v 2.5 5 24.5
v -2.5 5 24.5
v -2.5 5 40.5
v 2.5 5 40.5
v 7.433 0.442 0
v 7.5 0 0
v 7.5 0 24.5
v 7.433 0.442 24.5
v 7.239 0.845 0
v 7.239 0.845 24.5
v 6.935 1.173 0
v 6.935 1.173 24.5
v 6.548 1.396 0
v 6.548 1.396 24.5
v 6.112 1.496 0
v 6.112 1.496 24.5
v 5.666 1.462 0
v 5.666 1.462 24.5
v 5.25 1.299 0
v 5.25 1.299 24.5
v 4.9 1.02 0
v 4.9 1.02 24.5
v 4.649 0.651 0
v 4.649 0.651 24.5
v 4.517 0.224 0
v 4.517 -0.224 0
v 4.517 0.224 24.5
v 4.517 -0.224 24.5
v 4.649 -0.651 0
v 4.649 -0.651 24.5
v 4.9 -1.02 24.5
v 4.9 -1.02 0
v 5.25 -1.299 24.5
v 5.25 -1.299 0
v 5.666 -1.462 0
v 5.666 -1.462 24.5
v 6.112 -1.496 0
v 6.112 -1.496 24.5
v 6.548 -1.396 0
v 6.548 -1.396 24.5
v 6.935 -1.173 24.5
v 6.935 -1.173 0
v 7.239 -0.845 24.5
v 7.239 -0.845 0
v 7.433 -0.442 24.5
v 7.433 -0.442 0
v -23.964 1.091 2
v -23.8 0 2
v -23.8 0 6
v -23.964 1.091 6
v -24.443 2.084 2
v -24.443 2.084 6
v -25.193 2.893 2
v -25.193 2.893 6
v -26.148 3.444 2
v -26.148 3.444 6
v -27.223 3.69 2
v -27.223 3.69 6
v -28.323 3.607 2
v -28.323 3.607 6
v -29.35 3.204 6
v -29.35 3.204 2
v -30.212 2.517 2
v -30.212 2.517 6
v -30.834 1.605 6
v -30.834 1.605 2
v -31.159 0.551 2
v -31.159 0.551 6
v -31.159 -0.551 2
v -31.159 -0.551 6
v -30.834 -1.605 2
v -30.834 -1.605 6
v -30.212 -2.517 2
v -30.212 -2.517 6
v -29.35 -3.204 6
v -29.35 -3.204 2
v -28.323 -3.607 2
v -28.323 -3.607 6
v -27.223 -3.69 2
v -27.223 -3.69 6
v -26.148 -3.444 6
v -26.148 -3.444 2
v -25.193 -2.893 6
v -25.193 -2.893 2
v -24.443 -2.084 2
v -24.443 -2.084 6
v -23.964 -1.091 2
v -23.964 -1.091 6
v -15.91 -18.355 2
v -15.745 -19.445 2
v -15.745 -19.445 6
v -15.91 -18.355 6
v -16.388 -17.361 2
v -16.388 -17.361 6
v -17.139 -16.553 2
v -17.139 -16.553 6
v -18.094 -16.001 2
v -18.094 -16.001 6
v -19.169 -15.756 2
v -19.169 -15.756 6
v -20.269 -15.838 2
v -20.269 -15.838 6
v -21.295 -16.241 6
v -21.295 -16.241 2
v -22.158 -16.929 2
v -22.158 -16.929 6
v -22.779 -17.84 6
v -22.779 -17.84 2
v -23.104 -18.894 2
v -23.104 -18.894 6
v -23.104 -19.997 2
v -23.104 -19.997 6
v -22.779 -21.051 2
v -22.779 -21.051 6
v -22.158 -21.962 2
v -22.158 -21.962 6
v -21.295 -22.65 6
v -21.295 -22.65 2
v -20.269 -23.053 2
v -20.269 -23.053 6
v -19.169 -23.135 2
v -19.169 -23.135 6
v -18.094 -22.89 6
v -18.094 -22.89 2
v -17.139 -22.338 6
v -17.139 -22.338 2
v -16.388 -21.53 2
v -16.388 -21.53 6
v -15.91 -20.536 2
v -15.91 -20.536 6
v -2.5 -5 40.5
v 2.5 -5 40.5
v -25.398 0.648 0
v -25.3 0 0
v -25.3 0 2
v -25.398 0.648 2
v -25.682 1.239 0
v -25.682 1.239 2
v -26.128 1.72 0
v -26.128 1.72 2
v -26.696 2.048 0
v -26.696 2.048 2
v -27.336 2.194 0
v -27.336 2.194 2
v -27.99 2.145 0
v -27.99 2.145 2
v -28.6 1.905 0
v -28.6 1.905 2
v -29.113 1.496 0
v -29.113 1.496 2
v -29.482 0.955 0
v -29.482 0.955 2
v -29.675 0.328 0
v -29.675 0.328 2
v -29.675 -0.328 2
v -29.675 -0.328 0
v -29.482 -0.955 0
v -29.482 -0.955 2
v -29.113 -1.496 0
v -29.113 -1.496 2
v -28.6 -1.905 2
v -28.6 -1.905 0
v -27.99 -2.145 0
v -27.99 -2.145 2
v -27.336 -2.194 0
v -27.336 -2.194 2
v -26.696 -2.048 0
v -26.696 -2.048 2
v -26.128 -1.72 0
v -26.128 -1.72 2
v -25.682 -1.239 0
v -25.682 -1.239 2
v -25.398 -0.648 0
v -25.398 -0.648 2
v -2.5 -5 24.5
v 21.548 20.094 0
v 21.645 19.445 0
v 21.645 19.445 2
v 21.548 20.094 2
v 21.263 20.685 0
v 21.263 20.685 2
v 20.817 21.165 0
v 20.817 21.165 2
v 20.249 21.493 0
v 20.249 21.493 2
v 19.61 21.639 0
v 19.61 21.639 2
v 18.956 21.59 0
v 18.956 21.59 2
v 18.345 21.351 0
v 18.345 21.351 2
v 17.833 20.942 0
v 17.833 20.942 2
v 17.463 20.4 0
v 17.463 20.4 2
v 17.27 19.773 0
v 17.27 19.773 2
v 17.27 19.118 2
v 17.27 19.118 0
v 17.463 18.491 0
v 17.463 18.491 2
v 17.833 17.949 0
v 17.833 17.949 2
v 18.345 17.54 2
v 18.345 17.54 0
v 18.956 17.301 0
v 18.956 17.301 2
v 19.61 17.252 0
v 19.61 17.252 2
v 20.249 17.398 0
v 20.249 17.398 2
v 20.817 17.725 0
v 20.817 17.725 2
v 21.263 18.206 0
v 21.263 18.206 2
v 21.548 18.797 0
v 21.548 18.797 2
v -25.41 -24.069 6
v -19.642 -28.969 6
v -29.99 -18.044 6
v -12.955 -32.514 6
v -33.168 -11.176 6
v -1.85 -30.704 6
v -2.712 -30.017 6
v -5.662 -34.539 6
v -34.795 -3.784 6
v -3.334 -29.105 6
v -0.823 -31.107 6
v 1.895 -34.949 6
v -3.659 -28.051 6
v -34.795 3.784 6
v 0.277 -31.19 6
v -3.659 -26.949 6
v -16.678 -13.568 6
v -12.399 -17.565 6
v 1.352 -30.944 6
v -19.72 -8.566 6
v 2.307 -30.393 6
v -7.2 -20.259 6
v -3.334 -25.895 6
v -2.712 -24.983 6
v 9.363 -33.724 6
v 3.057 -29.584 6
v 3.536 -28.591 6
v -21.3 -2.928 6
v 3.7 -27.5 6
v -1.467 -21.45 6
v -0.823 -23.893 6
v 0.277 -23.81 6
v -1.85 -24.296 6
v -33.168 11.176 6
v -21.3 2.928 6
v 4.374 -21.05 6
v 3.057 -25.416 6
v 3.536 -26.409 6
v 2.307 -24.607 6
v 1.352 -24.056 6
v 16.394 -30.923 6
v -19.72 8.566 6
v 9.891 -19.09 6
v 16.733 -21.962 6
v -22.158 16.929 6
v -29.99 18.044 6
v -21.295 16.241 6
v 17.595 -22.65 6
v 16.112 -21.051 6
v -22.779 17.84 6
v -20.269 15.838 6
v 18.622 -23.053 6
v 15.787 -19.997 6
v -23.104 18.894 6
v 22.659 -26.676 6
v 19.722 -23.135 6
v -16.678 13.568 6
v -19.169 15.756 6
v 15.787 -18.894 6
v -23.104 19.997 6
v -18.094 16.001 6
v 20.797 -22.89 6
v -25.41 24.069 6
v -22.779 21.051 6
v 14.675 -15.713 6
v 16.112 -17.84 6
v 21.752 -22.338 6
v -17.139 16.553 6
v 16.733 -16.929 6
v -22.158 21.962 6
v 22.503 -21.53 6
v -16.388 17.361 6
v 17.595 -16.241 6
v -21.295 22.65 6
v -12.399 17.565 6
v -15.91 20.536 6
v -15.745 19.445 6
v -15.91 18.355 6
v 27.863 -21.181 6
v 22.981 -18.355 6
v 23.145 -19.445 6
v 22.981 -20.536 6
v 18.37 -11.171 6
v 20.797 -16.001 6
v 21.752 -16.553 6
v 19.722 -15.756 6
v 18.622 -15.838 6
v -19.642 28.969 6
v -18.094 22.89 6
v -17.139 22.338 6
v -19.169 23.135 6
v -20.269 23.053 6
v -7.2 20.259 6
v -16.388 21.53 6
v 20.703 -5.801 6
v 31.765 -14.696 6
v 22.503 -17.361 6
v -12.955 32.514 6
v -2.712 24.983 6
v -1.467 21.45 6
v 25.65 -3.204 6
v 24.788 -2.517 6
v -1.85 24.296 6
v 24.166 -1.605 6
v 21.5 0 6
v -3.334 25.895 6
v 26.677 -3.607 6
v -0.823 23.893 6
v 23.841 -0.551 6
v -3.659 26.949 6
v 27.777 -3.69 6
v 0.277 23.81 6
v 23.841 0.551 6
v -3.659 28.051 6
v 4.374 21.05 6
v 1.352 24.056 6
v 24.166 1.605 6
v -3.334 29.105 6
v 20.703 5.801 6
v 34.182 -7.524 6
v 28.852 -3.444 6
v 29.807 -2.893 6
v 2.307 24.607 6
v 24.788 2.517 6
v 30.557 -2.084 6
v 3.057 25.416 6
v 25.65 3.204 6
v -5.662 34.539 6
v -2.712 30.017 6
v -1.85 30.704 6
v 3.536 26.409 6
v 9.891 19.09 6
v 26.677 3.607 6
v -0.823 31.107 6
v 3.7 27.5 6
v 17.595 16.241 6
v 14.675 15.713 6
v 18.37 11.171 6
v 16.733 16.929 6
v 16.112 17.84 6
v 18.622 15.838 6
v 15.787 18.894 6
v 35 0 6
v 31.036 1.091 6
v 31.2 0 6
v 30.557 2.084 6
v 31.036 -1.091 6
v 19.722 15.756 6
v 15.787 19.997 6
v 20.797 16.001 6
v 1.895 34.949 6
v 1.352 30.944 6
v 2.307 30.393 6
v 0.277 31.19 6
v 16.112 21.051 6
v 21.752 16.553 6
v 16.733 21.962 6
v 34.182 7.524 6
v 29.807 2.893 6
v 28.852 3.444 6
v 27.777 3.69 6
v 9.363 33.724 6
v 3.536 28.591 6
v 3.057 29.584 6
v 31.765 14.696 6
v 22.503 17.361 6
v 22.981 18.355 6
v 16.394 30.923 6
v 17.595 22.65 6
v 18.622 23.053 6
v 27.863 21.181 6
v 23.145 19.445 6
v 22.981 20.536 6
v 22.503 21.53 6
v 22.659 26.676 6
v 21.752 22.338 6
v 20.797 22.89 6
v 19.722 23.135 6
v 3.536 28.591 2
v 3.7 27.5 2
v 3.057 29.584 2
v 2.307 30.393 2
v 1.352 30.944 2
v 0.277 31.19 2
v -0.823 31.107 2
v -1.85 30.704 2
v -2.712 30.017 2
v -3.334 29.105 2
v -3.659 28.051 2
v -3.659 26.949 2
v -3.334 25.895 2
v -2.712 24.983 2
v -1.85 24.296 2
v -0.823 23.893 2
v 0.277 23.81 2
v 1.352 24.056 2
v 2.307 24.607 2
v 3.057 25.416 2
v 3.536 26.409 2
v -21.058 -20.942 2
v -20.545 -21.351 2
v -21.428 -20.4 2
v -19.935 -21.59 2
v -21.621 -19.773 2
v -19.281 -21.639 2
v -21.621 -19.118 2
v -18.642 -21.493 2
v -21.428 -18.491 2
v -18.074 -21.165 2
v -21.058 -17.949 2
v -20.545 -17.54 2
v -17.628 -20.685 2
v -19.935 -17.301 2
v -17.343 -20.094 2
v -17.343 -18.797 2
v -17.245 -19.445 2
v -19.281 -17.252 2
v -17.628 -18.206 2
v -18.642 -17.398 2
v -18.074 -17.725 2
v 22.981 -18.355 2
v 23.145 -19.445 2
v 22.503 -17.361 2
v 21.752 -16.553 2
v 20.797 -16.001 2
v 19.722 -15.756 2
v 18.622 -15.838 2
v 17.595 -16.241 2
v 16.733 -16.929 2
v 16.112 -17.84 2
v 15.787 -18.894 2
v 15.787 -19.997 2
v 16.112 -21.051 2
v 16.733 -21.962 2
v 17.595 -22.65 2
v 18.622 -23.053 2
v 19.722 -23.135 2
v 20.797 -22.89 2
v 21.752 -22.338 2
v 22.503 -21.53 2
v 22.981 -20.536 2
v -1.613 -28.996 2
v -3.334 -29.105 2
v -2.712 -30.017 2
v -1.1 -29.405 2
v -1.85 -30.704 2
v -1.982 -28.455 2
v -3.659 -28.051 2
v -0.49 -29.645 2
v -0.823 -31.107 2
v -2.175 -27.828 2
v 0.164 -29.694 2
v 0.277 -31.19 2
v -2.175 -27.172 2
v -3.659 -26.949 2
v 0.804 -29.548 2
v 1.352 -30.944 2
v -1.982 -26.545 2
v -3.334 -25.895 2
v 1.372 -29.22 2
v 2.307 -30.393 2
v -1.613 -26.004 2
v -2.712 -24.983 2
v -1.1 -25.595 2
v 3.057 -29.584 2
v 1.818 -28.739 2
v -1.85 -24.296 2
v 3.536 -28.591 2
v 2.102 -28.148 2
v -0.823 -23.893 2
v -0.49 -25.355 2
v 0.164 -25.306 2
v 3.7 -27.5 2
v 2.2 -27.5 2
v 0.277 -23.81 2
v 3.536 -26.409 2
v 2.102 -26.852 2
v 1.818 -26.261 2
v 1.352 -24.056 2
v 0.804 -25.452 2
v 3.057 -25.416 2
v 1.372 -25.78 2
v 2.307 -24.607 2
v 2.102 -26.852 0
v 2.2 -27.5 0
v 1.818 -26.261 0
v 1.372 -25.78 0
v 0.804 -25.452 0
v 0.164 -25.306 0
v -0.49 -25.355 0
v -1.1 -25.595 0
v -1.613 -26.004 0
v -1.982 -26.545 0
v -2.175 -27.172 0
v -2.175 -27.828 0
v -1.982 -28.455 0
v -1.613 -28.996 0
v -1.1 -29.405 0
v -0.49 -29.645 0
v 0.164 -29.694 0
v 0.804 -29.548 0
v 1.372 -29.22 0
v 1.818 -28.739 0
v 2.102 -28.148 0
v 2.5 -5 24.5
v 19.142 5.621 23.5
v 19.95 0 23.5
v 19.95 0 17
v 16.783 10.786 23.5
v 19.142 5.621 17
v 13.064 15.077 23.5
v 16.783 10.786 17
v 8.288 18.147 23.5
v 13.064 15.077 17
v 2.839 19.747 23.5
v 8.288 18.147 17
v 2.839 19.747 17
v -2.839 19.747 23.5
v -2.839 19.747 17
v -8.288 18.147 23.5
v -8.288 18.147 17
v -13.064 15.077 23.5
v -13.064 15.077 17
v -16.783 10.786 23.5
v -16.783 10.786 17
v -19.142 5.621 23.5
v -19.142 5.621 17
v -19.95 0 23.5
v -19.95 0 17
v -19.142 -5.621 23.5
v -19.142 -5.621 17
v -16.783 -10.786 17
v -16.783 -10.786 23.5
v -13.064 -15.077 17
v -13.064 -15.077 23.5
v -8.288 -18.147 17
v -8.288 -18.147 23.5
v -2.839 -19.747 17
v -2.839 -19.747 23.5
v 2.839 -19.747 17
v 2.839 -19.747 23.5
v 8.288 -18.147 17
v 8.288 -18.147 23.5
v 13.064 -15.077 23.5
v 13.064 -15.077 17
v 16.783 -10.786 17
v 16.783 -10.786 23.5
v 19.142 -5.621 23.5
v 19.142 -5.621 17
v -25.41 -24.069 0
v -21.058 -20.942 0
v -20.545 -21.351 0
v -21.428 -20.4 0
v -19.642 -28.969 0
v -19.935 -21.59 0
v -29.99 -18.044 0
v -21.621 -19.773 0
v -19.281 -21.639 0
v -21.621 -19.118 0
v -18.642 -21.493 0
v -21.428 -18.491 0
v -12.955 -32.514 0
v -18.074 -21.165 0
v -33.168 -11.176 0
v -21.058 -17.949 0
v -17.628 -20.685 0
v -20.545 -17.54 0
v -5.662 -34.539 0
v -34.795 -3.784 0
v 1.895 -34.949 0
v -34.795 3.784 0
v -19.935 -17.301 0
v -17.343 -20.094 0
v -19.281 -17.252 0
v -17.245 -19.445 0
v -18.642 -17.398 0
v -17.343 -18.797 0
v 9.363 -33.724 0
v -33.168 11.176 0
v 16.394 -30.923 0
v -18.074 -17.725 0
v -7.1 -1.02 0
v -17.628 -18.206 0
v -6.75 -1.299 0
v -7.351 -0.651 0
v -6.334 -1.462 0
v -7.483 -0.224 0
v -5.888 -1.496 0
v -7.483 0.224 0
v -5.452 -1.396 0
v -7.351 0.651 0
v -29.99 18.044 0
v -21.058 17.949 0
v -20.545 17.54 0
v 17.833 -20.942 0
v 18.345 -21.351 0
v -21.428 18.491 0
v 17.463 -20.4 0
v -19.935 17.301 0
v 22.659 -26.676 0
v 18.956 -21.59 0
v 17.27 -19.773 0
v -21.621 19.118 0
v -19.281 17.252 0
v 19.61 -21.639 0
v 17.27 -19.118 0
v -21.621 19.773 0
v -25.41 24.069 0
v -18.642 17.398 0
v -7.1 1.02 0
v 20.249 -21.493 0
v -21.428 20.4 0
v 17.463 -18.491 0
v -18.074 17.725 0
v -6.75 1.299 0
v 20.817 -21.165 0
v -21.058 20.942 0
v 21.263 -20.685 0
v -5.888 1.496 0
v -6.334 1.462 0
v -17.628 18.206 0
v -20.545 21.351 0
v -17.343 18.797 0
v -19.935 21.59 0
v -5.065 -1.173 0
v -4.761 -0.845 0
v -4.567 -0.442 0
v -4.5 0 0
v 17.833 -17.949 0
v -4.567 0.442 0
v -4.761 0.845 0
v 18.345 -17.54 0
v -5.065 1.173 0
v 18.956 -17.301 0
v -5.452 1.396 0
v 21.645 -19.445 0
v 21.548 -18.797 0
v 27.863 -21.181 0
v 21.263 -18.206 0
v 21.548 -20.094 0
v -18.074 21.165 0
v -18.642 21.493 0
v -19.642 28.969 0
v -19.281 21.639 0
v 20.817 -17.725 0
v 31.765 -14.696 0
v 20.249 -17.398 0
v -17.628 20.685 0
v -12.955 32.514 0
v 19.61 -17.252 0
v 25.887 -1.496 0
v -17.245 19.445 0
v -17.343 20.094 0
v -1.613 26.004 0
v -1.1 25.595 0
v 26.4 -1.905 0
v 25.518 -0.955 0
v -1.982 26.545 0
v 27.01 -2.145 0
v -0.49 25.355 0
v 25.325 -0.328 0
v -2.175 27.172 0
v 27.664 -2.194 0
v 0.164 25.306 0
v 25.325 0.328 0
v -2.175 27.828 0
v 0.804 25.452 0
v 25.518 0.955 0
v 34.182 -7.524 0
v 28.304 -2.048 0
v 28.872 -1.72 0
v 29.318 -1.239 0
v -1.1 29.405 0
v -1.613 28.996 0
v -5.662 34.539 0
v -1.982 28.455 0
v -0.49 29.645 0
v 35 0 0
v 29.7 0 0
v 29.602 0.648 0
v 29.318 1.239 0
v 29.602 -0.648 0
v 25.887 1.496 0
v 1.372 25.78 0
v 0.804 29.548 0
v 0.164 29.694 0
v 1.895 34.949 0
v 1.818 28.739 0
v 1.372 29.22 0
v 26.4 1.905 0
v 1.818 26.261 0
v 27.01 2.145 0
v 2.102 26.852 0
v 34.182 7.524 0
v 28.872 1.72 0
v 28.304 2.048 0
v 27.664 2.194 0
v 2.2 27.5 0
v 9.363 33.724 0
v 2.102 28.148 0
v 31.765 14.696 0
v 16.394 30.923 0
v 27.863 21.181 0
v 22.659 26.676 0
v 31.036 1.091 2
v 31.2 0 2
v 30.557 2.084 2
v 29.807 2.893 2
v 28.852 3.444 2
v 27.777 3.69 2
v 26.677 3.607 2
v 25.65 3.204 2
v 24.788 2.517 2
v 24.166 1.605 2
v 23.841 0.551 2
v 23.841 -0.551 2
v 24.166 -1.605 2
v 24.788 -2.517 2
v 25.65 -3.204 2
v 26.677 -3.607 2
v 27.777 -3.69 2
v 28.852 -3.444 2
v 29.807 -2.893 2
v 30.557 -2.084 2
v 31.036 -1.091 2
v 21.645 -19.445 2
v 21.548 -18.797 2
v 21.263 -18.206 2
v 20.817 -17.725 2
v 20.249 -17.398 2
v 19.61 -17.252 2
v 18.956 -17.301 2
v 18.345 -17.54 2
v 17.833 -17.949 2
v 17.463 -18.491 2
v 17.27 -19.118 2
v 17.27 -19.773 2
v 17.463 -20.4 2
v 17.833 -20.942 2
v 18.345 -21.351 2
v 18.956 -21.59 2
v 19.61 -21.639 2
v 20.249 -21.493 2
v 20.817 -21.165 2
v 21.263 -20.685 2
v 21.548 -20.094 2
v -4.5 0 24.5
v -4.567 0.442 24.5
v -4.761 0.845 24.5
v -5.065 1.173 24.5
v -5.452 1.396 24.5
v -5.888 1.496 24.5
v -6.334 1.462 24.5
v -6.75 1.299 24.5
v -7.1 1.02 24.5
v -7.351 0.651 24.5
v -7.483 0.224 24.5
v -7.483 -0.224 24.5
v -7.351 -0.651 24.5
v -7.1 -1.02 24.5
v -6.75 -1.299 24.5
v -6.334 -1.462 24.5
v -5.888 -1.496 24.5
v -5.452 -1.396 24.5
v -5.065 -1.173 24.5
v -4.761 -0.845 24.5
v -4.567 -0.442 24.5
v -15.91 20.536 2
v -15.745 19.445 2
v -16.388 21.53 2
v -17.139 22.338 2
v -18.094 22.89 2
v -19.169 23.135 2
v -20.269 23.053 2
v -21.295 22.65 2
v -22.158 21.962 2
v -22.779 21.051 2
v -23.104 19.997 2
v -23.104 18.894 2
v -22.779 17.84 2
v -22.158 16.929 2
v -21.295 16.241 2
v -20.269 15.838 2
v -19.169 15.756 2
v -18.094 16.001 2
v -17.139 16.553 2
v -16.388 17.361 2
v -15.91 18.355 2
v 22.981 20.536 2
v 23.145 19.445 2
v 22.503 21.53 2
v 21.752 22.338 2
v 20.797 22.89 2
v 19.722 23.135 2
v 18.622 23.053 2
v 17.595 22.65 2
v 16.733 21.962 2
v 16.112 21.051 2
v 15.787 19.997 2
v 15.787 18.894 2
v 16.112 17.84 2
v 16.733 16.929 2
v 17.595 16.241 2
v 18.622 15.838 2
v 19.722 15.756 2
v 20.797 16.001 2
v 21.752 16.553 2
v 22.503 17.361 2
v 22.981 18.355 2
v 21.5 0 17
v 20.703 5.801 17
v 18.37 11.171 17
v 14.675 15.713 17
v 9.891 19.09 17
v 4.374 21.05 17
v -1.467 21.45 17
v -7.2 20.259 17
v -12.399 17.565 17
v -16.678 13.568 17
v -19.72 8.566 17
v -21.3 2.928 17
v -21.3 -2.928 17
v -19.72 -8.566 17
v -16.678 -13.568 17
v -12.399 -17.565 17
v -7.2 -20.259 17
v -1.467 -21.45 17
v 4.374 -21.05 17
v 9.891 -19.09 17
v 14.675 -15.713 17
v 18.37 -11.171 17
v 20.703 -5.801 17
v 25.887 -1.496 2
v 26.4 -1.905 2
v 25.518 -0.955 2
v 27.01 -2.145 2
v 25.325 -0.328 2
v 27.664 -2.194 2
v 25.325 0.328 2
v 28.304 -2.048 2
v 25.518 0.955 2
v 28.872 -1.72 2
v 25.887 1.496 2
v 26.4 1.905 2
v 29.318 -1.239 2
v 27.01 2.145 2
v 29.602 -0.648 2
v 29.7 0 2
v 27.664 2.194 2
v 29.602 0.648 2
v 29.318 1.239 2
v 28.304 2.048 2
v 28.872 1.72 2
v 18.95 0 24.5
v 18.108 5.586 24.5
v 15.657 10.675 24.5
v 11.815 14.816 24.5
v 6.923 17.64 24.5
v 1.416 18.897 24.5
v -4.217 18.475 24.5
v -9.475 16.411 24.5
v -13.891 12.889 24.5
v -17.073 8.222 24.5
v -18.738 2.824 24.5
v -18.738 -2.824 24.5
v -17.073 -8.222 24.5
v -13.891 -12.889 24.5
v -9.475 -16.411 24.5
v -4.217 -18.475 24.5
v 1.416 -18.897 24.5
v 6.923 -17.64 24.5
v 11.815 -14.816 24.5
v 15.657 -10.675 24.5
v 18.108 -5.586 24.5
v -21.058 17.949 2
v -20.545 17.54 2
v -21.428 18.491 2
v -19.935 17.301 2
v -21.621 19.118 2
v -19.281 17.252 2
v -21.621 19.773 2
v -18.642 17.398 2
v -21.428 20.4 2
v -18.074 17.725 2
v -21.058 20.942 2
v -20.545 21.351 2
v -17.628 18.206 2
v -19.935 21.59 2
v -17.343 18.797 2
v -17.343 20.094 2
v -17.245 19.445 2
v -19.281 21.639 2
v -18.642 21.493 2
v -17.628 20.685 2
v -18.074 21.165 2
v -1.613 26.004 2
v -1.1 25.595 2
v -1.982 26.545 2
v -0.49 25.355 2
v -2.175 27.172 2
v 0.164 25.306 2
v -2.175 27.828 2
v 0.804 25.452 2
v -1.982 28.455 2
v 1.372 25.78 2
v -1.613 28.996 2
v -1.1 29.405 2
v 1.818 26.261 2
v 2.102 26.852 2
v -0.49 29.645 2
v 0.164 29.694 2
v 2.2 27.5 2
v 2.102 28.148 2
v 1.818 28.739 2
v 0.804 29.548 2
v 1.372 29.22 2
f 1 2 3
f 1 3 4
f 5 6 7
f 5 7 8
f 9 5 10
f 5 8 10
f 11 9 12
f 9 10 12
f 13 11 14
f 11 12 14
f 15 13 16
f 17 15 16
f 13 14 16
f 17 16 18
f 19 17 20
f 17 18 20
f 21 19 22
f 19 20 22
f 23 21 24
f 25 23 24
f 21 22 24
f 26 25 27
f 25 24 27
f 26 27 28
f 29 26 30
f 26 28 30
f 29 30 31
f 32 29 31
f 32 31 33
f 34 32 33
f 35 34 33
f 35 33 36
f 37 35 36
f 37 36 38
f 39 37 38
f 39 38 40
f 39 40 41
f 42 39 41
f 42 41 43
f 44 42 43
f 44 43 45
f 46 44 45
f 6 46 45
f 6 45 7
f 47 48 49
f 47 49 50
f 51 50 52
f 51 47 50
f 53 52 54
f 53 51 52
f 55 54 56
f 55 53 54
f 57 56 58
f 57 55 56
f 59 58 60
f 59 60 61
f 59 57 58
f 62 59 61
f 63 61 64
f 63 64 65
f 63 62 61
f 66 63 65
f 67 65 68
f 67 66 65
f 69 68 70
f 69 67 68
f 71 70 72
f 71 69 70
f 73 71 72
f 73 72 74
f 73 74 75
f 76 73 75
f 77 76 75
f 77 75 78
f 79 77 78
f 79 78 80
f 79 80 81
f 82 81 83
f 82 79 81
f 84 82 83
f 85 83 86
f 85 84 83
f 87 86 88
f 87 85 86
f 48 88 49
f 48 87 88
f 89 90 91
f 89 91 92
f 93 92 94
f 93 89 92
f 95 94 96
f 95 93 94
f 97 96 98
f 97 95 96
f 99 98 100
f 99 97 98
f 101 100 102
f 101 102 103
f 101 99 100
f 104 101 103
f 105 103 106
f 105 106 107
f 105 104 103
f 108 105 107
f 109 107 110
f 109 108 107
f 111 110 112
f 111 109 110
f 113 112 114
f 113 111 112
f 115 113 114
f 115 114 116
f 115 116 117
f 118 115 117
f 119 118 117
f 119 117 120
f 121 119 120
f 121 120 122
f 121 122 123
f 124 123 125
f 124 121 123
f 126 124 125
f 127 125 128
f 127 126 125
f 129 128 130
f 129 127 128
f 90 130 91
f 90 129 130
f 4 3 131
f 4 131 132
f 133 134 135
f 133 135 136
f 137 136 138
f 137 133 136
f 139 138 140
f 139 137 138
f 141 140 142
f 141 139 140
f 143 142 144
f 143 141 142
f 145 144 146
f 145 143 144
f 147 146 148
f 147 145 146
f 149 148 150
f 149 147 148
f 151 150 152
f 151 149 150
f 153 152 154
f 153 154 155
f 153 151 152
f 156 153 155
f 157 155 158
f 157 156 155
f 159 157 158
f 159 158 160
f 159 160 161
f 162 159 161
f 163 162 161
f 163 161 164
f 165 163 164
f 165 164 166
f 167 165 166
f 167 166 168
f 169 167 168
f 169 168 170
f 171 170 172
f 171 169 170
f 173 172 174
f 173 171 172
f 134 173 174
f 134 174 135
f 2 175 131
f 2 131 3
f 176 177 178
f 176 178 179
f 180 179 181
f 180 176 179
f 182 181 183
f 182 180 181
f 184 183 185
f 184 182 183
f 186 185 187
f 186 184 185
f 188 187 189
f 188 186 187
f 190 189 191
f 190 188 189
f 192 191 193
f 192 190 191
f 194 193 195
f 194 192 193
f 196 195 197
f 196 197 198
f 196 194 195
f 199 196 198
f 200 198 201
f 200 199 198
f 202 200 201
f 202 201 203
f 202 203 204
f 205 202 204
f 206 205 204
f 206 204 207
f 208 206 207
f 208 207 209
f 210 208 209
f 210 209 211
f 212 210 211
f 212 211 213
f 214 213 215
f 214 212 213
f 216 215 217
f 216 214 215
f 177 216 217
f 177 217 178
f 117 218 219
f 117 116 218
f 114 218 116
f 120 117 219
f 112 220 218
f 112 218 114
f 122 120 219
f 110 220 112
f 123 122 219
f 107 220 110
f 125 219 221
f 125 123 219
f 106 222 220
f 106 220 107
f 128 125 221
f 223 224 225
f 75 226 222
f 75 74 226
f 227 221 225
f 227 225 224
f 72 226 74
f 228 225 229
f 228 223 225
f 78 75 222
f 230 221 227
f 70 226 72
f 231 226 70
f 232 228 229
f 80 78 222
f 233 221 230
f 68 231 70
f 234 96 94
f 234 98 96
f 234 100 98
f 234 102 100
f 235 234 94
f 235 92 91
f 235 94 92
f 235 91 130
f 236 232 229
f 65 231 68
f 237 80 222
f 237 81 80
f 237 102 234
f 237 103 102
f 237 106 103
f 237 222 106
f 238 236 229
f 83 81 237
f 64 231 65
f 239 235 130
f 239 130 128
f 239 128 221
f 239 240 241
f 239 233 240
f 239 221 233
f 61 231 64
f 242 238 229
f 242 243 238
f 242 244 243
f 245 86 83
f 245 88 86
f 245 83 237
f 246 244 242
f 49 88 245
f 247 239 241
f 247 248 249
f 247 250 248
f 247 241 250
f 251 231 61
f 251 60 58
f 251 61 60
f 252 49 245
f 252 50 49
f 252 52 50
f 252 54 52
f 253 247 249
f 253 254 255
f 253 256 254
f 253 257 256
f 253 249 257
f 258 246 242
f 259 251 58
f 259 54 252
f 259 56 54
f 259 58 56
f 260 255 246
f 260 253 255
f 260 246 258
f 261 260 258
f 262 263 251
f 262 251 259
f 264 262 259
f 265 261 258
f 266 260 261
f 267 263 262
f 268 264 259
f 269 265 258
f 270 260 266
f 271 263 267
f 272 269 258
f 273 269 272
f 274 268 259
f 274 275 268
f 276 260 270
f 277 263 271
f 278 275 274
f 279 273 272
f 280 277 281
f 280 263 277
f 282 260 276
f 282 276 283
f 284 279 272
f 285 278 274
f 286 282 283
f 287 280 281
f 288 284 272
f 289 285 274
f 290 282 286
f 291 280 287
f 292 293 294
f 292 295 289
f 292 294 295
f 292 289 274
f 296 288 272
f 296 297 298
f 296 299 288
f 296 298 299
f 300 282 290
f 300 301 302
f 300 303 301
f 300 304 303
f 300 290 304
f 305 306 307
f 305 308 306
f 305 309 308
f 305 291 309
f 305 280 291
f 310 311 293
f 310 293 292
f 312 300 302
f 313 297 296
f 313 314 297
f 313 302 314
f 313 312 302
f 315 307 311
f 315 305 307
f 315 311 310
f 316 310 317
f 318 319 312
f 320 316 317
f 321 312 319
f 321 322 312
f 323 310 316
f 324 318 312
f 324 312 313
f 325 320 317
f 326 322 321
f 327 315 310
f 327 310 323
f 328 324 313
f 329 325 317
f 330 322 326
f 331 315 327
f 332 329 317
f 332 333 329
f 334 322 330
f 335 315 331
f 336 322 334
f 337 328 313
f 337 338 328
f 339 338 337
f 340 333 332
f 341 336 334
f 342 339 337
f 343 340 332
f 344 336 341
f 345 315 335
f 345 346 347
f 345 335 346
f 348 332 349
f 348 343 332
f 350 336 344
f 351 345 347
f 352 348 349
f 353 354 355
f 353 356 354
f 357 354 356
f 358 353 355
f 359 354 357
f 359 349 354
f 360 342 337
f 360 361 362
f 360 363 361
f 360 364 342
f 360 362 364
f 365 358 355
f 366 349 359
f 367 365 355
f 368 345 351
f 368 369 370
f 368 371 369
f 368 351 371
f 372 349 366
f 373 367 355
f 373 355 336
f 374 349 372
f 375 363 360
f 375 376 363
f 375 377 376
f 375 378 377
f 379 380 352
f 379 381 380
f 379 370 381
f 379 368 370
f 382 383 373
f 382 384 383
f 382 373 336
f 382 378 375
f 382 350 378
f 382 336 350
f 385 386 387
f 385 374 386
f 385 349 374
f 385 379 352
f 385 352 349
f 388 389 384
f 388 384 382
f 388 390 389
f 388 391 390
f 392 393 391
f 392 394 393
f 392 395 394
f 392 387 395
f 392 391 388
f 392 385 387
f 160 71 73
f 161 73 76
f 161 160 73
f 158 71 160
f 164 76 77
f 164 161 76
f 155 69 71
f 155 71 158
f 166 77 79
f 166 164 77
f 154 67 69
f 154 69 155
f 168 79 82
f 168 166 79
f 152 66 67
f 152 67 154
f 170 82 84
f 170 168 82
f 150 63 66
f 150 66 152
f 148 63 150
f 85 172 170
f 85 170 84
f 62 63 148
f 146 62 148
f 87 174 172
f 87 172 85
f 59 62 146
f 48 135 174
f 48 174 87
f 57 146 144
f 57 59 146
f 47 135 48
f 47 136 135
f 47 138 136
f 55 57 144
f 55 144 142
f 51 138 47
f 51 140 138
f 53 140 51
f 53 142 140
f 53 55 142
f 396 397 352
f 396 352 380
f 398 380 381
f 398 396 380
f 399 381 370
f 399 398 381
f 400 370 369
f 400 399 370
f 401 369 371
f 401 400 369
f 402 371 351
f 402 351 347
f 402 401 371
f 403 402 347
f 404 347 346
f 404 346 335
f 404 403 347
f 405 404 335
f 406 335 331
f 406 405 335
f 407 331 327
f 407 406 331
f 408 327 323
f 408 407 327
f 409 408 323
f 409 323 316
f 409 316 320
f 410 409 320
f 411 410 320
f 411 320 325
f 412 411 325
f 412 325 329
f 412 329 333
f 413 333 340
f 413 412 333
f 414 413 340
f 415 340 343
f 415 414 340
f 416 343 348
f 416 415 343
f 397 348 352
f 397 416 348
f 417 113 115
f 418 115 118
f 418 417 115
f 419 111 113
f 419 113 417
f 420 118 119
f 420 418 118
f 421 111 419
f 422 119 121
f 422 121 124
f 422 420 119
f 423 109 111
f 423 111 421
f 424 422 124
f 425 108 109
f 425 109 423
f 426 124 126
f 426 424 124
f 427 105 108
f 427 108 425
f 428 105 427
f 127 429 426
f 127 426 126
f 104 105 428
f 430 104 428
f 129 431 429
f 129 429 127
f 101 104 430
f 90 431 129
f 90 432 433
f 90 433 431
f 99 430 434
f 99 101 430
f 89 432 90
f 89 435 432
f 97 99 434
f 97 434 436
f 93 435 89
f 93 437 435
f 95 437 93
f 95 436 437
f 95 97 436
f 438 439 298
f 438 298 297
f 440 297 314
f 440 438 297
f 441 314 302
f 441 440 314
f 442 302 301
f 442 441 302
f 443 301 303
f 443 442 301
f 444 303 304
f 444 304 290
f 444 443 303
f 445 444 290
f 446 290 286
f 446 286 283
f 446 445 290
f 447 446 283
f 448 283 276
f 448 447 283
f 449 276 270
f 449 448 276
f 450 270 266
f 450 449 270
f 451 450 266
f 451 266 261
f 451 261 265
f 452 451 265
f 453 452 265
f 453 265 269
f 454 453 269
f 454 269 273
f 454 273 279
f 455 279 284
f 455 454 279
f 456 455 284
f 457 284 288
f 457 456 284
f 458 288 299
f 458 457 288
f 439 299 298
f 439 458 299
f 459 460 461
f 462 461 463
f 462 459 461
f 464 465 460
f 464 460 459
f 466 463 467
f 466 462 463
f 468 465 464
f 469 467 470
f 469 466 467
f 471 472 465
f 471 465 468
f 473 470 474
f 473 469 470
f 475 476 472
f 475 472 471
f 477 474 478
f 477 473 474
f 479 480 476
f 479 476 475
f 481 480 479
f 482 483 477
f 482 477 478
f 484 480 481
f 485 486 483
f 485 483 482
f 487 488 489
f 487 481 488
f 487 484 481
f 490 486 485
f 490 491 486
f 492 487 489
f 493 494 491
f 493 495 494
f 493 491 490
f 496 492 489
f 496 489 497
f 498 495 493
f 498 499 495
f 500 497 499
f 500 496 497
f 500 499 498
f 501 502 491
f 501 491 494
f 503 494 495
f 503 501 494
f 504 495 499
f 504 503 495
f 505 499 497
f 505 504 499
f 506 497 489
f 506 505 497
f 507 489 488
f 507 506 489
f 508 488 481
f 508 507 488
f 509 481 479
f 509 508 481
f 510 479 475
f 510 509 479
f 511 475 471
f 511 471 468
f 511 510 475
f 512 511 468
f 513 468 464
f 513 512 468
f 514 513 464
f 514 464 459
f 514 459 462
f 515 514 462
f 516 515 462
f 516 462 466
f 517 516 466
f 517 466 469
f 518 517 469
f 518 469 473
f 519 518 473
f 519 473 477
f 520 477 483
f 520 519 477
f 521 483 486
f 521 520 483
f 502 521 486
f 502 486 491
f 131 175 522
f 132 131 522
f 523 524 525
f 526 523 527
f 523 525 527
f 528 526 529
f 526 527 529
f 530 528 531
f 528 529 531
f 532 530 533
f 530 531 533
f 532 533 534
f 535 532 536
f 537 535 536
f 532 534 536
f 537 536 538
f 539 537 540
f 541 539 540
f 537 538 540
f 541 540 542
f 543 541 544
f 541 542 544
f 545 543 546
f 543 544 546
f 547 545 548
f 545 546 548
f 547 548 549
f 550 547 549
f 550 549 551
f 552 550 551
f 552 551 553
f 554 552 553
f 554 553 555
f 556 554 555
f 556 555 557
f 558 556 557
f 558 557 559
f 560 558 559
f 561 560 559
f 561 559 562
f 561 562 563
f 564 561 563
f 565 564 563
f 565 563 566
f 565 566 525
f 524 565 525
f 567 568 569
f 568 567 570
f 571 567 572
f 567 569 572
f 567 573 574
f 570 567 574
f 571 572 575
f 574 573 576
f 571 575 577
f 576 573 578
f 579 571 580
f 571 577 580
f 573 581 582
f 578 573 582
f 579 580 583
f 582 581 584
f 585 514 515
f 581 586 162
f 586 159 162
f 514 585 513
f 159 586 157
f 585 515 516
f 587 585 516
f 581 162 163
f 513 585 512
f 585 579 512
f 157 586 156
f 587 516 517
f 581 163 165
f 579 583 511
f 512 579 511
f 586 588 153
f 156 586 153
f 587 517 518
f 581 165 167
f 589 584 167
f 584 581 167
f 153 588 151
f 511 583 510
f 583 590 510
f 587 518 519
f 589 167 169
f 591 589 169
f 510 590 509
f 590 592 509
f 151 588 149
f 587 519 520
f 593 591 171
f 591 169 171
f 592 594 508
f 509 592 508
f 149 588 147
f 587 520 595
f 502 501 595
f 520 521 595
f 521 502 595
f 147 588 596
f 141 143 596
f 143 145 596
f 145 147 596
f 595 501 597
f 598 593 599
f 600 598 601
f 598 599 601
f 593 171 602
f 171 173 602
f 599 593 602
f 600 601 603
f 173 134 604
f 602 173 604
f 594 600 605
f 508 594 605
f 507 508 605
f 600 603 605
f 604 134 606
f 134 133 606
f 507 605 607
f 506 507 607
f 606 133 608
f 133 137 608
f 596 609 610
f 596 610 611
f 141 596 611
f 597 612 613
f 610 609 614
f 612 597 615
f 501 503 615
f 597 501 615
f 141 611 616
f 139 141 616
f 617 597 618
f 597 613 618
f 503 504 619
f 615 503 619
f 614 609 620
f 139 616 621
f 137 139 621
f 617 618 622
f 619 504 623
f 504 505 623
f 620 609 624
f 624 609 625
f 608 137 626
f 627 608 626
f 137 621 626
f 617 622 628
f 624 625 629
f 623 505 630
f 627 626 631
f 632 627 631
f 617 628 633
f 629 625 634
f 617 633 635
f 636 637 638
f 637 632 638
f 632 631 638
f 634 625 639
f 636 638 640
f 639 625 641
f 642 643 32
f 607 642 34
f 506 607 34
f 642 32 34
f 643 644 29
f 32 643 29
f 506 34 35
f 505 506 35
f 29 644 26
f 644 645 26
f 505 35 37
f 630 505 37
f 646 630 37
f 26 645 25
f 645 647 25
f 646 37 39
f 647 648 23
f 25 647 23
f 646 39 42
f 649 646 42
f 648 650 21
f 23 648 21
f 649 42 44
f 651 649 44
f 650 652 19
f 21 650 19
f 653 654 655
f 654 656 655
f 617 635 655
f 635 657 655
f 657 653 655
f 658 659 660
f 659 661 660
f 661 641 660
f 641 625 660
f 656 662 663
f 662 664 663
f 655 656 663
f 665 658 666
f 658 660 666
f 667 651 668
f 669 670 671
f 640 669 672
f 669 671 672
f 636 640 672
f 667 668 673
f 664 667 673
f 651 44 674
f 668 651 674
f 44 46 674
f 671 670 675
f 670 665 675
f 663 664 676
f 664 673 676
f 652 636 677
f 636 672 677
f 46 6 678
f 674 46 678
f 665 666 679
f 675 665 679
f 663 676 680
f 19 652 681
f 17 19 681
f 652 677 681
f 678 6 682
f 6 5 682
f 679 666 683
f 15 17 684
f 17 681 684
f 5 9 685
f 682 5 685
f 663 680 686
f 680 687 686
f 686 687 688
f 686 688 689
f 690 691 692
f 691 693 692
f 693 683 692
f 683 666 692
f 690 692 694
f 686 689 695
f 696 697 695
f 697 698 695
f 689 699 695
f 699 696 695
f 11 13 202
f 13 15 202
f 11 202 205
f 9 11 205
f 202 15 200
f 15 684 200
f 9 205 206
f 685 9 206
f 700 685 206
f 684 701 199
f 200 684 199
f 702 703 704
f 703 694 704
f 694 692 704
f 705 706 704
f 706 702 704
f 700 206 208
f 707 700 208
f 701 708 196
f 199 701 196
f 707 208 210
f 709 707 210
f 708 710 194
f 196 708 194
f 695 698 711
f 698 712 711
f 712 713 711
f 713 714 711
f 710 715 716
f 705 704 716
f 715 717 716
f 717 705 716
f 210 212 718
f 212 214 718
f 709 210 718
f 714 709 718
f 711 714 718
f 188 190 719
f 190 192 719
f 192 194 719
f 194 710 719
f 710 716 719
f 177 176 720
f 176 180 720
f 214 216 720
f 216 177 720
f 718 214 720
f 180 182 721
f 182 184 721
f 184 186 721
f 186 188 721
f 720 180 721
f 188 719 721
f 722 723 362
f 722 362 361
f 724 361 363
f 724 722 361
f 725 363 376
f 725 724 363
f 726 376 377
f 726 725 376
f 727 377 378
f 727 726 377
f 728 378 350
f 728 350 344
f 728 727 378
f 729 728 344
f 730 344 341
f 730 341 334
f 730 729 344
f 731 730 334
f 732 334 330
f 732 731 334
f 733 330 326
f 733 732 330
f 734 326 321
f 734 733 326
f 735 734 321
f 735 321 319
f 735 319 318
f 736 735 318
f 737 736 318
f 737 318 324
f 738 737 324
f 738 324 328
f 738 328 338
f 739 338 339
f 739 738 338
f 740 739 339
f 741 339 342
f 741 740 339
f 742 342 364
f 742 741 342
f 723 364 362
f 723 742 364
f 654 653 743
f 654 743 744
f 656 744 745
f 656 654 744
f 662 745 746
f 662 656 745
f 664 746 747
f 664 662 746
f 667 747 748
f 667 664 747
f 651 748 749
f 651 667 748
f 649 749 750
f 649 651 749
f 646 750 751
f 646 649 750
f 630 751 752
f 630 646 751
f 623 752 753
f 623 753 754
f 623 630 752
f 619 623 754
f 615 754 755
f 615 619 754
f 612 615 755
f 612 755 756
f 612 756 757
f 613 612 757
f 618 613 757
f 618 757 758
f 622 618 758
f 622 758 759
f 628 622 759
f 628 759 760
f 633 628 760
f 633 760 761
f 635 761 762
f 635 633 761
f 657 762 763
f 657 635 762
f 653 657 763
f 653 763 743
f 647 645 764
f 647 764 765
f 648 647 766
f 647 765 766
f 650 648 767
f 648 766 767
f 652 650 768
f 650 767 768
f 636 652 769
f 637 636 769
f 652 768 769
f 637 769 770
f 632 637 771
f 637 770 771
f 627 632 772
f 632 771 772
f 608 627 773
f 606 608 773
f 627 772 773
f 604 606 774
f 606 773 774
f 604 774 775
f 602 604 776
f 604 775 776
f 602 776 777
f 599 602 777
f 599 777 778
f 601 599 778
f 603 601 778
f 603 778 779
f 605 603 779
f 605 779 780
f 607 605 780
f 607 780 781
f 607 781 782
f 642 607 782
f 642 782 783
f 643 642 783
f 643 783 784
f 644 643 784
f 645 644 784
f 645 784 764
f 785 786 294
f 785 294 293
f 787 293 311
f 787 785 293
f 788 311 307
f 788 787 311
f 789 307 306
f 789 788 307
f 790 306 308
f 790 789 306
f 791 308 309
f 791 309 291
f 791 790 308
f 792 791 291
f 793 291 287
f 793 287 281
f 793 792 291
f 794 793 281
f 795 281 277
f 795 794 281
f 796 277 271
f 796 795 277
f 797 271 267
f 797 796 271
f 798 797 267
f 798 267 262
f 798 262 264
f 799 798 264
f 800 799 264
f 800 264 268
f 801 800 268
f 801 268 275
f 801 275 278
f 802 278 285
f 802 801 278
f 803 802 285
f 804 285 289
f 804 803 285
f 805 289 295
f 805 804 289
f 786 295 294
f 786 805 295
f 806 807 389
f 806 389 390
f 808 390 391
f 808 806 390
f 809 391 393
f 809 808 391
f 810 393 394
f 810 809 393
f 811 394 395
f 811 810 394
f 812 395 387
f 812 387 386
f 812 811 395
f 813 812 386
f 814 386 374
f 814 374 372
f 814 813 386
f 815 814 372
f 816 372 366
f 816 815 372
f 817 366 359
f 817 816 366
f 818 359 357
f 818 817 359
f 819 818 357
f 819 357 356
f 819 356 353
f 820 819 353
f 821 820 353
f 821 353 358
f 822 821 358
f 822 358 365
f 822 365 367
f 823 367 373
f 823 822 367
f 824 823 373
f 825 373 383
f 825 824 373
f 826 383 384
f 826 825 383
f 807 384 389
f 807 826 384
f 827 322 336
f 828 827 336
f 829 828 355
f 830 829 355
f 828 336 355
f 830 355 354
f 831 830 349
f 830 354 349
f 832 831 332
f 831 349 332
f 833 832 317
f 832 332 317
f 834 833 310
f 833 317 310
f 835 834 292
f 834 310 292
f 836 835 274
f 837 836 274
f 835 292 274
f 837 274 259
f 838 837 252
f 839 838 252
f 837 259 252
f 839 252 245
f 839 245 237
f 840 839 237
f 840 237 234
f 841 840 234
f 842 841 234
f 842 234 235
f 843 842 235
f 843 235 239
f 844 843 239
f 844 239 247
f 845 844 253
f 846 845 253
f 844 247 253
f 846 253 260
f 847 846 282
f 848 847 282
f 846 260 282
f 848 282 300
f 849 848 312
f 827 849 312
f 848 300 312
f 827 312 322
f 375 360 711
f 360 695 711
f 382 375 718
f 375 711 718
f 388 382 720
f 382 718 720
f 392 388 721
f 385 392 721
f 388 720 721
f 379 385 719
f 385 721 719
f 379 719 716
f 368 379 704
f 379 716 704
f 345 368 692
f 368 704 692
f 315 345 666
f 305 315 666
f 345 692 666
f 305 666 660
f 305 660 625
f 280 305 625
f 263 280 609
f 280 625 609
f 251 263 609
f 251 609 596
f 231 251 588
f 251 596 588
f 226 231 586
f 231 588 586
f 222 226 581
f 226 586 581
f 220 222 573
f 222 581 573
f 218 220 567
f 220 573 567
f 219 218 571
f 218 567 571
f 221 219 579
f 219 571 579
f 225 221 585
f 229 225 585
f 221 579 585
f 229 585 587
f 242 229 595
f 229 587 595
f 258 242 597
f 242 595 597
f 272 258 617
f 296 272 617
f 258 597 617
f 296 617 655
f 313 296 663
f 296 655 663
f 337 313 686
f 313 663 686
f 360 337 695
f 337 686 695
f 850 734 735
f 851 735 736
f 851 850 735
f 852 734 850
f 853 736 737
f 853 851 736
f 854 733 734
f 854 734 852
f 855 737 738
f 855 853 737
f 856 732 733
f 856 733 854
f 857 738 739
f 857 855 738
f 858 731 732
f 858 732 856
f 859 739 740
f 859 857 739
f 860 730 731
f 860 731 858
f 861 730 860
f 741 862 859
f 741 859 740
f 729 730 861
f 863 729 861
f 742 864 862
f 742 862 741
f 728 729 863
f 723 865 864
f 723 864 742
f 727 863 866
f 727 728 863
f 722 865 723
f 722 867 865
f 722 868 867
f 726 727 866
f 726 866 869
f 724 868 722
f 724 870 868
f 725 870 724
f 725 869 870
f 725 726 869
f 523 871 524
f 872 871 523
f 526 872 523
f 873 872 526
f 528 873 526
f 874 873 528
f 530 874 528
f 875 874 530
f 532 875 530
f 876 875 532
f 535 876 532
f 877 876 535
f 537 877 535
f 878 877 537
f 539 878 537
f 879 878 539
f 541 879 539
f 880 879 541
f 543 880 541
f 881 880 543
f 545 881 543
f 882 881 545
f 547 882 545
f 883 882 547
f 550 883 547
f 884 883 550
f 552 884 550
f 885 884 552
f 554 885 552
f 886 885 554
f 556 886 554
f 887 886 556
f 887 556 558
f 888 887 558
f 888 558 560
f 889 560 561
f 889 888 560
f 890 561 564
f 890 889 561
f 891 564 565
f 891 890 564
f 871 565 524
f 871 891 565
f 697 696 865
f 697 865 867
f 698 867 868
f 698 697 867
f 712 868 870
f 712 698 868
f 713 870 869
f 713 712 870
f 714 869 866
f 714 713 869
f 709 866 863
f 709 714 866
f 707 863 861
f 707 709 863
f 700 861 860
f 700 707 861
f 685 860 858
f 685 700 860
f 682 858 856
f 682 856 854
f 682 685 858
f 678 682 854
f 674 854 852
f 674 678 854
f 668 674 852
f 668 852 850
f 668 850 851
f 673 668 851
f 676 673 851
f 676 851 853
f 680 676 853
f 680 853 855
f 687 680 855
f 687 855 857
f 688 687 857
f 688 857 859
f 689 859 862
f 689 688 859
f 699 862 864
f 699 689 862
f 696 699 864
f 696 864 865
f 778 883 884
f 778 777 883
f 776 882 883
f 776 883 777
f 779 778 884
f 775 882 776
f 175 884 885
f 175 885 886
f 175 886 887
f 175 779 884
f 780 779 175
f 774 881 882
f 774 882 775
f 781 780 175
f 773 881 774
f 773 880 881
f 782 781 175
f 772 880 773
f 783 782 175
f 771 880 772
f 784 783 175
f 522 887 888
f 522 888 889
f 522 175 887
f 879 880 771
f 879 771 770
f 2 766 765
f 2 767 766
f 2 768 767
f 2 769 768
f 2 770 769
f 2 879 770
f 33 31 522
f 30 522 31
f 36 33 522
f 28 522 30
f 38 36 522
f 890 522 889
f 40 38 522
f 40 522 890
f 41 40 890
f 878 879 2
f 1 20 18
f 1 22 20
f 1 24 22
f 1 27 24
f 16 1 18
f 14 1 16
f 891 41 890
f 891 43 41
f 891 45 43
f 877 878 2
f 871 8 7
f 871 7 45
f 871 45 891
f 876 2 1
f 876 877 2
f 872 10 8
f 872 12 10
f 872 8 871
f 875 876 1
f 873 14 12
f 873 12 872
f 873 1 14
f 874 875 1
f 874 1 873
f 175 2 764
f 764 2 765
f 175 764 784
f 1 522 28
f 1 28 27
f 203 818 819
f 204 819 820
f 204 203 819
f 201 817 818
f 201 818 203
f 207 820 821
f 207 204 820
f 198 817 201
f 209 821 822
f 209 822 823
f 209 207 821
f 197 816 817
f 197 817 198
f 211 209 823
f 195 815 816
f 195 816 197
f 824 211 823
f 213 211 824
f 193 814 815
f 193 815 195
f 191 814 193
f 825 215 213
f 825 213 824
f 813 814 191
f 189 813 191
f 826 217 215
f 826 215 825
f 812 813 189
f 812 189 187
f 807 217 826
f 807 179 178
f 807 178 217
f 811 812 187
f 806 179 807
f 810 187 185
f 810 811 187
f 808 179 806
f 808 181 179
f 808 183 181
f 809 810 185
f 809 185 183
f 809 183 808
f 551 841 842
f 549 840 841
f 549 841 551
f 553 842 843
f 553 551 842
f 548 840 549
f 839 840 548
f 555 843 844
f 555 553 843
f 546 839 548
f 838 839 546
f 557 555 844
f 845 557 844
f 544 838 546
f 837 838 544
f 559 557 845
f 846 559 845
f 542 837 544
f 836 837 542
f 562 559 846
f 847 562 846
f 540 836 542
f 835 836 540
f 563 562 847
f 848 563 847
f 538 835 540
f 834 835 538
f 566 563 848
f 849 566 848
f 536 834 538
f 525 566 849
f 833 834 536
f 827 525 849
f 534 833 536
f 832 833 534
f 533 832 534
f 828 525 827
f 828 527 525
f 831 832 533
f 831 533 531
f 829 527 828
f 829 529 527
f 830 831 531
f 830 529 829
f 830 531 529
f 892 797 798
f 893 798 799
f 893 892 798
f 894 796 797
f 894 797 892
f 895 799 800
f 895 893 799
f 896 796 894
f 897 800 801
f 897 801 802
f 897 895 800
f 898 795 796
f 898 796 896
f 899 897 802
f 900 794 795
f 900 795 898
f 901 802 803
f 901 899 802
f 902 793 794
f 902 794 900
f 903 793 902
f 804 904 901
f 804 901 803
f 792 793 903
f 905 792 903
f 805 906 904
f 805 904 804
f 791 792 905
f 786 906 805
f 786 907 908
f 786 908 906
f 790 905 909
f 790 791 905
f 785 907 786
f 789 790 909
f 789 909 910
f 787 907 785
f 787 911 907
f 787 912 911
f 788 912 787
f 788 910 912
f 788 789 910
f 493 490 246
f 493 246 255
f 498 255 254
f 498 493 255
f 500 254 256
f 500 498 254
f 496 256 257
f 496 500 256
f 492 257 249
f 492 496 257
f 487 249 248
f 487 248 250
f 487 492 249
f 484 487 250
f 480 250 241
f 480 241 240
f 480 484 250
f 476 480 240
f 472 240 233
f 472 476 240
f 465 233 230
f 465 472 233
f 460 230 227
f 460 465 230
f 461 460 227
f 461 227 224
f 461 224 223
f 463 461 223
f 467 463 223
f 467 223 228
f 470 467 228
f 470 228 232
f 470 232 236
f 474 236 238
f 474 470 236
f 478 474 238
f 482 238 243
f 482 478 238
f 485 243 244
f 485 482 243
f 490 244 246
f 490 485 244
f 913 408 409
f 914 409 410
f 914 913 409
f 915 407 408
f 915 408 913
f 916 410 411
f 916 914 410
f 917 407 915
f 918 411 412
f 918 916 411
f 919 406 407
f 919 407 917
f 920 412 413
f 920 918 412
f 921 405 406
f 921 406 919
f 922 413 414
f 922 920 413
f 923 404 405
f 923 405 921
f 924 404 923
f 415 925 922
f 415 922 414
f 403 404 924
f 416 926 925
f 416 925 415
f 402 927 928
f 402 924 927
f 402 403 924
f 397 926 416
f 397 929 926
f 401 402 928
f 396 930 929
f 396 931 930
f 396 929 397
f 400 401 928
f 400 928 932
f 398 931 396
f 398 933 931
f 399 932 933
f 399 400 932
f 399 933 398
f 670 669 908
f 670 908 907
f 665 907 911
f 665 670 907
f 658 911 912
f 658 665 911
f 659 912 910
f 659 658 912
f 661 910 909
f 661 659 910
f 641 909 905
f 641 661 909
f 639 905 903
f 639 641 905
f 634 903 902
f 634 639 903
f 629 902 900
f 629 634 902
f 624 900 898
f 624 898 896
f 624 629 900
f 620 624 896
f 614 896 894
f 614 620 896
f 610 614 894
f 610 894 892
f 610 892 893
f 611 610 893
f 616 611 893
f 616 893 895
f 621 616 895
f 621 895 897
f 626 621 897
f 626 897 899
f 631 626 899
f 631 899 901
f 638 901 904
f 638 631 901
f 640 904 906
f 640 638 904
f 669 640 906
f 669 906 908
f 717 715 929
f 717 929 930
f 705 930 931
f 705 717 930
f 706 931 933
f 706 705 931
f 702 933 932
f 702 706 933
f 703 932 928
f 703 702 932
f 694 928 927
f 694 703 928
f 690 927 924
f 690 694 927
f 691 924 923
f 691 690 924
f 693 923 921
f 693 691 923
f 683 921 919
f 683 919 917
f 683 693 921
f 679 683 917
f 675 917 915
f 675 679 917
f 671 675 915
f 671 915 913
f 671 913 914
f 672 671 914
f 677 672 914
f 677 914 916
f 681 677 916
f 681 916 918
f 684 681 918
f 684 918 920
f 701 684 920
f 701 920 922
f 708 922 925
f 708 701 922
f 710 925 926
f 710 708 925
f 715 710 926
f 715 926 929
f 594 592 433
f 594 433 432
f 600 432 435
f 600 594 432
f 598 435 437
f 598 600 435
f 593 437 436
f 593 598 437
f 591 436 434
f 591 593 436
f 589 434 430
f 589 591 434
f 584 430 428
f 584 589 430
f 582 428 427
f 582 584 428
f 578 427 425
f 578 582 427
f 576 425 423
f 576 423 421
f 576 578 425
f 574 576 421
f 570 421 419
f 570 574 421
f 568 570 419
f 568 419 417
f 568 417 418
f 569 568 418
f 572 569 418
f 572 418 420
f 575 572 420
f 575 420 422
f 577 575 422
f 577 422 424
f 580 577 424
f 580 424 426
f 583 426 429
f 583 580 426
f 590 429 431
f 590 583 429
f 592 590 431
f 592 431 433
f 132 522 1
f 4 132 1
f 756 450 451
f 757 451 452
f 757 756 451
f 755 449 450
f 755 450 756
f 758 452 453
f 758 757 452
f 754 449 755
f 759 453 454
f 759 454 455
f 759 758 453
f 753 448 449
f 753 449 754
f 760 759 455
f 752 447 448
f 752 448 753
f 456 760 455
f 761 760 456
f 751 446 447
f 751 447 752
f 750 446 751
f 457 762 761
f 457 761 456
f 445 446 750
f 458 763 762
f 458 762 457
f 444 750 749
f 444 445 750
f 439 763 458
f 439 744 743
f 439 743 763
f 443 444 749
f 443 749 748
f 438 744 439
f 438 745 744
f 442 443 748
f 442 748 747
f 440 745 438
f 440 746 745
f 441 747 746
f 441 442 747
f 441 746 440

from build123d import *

# Parameters (mm, degrees)
SKETCH1_R           = 35
SKETCH1_R_2         = 2.2
BOSS_EXTRUDE1_DEPTH = 2
SKETCH2_R           = 35
SKETCH2_R_2         = 3.7
BOSS_EXTRUDE2_DEPTH = 4
SKETCH4_R           = 19.95
BOSS_EXTRUDE3_DEPTH = 18.5
SKETCH6_W           = 5
SKETCH6_H           = 10
BOSS_EXTRUDE4_DEPTH = 16
SKETCH7_R           = 21.5
BOSS_EXTRUDE5_DEPTH = 11
SKETCH5_R           = 1.5
CUT_EXTRUDE1_DEPTH  = 25.5
CHAMFER1_SIZE       = 1


with BuildPart() as part:
    # Sketch1 → Boss-Extrude1 (new body)
    with BuildSketch(Plane.XY):
        Circle(SKETCH1_R)
        with Locations((0, 27.5)):
            Circle(SKETCH1_R_2, mode=Mode.SUBTRACT)
        with Locations((19.445436483, 19.445436483)):
            Circle(SKETCH1_R_2, mode=Mode.SUBTRACT)
        with Locations((27.5, 0)):
            Circle(SKETCH1_R_2, mode=Mode.SUBTRACT)
        with Locations((19.445436483, -19.445436483)):
            Circle(SKETCH1_R_2, mode=Mode.SUBTRACT)
        with Locations((0, -27.5)):
            Circle(SKETCH1_R_2, mode=Mode.SUBTRACT)
        with Locations((-19.445436483, -19.445436483)):
            Circle(SKETCH1_R_2, mode=Mode.SUBTRACT)
        with Locations((-27.5, 0)):
            Circle(SKETCH1_R_2, mode=Mode.SUBTRACT)
        with Locations((-19.445436483, 19.445436483)):
            Circle(SKETCH1_R_2, mode=Mode.SUBTRACT)
    extrude(amount=BOSS_EXTRUDE1_DEPTH)

    # Sketch2 → Boss-Extrude2 (add)
    with BuildSketch(Plane.XY.offset(2)):
        Circle(SKETCH2_R)
        with Locations((-27.5, 0)):
            Circle(SKETCH2_R_2, mode=Mode.SUBTRACT)
        with Locations((0, -27.5)):
            Circle(SKETCH2_R_2, mode=Mode.SUBTRACT)
        with Locations((27.5, 0)):
            Circle(SKETCH2_R_2, mode=Mode.SUBTRACT)
        with Locations((0, 27.5)):
            Circle(SKETCH2_R_2, mode=Mode.SUBTRACT)
        with Locations((19.445436483, 19.445436483)):
            Circle(SKETCH2_R_2, mode=Mode.SUBTRACT)
        with Locations((19.445436483, -19.445436483)):
            Circle(SKETCH2_R_2, mode=Mode.SUBTRACT)
        with Locations((-19.445436483, -19.445436483)):
            Circle(SKETCH2_R_2, mode=Mode.SUBTRACT)
        with Locations((-19.445436483, 19.445436483)):
            Circle(SKETCH2_R_2, mode=Mode.SUBTRACT)
    extrude(amount=BOSS_EXTRUDE2_DEPTH)

    # Sketch4 → Boss-Extrude3 (add)
    with BuildSketch(Plane.XY.offset(6)):
        Circle(SKETCH4_R)
    extrude(amount=BOSS_EXTRUDE3_DEPTH)

    # Sketch6 → Boss-Extrude4 (add)
    with BuildSketch(Plane.XY.offset(24.5)):
        Rectangle(SKETCH6_W, SKETCH6_H)
    extrude(amount=BOSS_EXTRUDE4_DEPTH)

    # Sketch7 → Boss-Extrude5 (add)
    with BuildSketch(Plane.XY.offset(6)):
        Circle(SKETCH7_R)
    extrude(amount=BOSS_EXTRUDE5_DEPTH)

    # Sketch5 → Cut-Extrude1 (cut, through all)
    with BuildSketch(Plane.XY.offset(24.5)):
        with Locations((-6, 0)):
            Circle(SKETCH5_R)
        with Locations((6, 0)):
            Circle(SKETCH5_R)
    extrude(amount=-CUT_EXTRUDE1_DEPTH, mode=Mode.SUBTRACT)

    # Chamfer1
    chamfer1_edges = [part.edges().sort_by_distance(p)[0] for p in [
        (-19.95, 0, 24.5),
    ]]
    chamfer(chamfer1_edges, length=CHAMFER1_SIZE)


solid = part.part
